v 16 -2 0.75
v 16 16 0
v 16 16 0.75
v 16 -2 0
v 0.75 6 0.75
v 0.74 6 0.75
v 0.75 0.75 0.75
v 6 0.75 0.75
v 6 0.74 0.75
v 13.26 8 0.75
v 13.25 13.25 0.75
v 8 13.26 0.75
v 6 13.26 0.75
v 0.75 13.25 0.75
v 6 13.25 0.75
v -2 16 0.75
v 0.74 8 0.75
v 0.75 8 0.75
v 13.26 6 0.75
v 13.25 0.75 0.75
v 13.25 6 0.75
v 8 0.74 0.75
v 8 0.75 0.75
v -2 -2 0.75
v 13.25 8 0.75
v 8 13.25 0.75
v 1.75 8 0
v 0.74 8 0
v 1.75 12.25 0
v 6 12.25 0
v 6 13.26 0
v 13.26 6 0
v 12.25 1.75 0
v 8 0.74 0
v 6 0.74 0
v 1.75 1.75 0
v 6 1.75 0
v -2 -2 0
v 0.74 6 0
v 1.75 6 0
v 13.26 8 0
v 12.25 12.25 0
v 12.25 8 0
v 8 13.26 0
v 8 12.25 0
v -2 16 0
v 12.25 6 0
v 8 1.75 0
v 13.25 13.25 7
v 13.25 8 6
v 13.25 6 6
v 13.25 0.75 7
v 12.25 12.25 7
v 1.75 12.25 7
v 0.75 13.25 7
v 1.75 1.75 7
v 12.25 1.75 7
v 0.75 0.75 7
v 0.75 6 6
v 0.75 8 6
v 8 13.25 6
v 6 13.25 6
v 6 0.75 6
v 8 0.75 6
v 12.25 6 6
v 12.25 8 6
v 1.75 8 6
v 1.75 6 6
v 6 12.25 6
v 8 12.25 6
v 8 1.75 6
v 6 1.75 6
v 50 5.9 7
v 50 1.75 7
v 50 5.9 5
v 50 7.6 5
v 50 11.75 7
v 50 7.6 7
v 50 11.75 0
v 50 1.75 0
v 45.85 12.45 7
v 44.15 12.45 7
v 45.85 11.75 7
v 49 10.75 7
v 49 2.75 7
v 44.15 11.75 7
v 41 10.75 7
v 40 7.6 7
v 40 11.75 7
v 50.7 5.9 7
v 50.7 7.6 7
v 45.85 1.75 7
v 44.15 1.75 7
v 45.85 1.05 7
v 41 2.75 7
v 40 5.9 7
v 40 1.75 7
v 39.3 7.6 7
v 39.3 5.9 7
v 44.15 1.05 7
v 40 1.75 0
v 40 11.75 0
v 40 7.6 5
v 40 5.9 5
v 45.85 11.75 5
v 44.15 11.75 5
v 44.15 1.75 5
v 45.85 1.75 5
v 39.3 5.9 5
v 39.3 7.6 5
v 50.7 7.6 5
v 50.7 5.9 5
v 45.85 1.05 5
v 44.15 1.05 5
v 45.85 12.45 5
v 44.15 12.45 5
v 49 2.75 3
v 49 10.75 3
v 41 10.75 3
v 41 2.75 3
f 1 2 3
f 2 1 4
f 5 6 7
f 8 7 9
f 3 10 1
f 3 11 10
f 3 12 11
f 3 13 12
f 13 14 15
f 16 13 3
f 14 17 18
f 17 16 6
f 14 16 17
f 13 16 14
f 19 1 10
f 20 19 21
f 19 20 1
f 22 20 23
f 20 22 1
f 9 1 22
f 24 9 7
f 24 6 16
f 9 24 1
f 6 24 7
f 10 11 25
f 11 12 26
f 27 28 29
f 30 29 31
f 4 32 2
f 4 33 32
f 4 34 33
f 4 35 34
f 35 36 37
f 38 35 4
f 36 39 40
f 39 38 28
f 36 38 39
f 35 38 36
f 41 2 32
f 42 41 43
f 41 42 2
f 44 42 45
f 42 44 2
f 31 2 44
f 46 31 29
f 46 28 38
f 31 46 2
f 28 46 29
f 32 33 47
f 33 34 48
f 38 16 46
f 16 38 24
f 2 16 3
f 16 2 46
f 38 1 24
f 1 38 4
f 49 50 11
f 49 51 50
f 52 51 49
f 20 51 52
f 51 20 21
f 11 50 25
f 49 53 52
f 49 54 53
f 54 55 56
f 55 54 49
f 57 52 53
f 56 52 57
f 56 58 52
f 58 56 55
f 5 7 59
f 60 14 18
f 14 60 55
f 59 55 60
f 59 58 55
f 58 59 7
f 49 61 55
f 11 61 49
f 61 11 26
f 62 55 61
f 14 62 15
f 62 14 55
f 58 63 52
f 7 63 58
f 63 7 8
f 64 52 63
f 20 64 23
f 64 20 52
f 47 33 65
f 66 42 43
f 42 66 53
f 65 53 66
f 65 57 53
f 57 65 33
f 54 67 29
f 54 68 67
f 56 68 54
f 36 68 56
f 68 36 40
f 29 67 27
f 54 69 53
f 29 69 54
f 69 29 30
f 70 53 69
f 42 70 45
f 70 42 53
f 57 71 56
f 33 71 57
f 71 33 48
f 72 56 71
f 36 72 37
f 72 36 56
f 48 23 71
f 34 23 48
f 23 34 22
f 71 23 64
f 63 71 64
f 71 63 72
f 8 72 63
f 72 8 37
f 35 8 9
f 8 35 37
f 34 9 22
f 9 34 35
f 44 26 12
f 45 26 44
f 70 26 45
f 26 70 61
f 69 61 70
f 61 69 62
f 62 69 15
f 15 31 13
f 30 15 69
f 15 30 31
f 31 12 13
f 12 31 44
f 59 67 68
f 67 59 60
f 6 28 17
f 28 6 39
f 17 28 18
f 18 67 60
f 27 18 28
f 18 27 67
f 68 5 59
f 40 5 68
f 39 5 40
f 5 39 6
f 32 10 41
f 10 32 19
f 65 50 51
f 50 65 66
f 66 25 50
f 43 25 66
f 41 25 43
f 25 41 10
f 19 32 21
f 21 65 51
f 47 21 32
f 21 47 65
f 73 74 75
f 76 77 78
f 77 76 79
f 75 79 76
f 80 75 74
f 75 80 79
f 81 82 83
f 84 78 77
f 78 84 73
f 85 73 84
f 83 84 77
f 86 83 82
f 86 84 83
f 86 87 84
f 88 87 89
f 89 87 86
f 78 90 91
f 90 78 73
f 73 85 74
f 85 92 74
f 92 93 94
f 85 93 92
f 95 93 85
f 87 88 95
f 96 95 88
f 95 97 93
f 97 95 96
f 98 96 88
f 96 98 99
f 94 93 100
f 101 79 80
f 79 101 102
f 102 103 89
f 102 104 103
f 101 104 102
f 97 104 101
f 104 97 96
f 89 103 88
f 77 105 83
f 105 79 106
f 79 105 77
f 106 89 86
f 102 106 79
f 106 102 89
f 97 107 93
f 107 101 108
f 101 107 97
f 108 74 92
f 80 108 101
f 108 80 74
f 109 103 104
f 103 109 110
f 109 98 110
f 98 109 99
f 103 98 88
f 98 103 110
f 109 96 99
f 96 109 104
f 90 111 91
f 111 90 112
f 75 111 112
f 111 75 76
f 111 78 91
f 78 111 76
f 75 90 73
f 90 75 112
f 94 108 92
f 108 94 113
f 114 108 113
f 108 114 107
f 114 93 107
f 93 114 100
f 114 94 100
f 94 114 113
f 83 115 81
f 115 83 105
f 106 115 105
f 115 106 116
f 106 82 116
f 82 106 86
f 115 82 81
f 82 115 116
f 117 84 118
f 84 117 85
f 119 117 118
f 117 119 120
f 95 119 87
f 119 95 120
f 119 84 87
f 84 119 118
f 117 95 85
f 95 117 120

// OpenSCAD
$fa = 1;
$fs = 0.5;
$fn = 50;

tk=0.5;

difference() {
  union() {
    translate([-2,-2,0]) cube([18,18,0.75]);
    translate([0.75,0.75,0]) cube([12.5,12.5,7]);
  }
  translate([1.75,1.75,-0.5]) cube([10.5,10.5,8]);
  
  translate([6,0.74,-1]) cube([2,2,7]);
  translate([6,11.26,-1]) cube([2,2,7]);
  
  translate([0.74,6,-1]) cube([2,2,7]);
  translate([11.26,6,-1]) cube([2,2,7]);
}

translate([40,1.75,0]) {
  
  difference() {
    cs=1.7;
    union() {
      cube([10,10,7]);
      translate([1-cs,5-cs/2,5]) cube([cs,cs,2]);
      translate([9,5-cs/2,5]) cube([cs,cs,2]);
      translate([5-cs/2,1-cs,5]) cube([cs,cs,,2]);
      translate([5-cs/2,9,5]) cube([cs,cs,2]);
    }
    translate([1,1,3]) cube([8,8,5]);
  }
}
